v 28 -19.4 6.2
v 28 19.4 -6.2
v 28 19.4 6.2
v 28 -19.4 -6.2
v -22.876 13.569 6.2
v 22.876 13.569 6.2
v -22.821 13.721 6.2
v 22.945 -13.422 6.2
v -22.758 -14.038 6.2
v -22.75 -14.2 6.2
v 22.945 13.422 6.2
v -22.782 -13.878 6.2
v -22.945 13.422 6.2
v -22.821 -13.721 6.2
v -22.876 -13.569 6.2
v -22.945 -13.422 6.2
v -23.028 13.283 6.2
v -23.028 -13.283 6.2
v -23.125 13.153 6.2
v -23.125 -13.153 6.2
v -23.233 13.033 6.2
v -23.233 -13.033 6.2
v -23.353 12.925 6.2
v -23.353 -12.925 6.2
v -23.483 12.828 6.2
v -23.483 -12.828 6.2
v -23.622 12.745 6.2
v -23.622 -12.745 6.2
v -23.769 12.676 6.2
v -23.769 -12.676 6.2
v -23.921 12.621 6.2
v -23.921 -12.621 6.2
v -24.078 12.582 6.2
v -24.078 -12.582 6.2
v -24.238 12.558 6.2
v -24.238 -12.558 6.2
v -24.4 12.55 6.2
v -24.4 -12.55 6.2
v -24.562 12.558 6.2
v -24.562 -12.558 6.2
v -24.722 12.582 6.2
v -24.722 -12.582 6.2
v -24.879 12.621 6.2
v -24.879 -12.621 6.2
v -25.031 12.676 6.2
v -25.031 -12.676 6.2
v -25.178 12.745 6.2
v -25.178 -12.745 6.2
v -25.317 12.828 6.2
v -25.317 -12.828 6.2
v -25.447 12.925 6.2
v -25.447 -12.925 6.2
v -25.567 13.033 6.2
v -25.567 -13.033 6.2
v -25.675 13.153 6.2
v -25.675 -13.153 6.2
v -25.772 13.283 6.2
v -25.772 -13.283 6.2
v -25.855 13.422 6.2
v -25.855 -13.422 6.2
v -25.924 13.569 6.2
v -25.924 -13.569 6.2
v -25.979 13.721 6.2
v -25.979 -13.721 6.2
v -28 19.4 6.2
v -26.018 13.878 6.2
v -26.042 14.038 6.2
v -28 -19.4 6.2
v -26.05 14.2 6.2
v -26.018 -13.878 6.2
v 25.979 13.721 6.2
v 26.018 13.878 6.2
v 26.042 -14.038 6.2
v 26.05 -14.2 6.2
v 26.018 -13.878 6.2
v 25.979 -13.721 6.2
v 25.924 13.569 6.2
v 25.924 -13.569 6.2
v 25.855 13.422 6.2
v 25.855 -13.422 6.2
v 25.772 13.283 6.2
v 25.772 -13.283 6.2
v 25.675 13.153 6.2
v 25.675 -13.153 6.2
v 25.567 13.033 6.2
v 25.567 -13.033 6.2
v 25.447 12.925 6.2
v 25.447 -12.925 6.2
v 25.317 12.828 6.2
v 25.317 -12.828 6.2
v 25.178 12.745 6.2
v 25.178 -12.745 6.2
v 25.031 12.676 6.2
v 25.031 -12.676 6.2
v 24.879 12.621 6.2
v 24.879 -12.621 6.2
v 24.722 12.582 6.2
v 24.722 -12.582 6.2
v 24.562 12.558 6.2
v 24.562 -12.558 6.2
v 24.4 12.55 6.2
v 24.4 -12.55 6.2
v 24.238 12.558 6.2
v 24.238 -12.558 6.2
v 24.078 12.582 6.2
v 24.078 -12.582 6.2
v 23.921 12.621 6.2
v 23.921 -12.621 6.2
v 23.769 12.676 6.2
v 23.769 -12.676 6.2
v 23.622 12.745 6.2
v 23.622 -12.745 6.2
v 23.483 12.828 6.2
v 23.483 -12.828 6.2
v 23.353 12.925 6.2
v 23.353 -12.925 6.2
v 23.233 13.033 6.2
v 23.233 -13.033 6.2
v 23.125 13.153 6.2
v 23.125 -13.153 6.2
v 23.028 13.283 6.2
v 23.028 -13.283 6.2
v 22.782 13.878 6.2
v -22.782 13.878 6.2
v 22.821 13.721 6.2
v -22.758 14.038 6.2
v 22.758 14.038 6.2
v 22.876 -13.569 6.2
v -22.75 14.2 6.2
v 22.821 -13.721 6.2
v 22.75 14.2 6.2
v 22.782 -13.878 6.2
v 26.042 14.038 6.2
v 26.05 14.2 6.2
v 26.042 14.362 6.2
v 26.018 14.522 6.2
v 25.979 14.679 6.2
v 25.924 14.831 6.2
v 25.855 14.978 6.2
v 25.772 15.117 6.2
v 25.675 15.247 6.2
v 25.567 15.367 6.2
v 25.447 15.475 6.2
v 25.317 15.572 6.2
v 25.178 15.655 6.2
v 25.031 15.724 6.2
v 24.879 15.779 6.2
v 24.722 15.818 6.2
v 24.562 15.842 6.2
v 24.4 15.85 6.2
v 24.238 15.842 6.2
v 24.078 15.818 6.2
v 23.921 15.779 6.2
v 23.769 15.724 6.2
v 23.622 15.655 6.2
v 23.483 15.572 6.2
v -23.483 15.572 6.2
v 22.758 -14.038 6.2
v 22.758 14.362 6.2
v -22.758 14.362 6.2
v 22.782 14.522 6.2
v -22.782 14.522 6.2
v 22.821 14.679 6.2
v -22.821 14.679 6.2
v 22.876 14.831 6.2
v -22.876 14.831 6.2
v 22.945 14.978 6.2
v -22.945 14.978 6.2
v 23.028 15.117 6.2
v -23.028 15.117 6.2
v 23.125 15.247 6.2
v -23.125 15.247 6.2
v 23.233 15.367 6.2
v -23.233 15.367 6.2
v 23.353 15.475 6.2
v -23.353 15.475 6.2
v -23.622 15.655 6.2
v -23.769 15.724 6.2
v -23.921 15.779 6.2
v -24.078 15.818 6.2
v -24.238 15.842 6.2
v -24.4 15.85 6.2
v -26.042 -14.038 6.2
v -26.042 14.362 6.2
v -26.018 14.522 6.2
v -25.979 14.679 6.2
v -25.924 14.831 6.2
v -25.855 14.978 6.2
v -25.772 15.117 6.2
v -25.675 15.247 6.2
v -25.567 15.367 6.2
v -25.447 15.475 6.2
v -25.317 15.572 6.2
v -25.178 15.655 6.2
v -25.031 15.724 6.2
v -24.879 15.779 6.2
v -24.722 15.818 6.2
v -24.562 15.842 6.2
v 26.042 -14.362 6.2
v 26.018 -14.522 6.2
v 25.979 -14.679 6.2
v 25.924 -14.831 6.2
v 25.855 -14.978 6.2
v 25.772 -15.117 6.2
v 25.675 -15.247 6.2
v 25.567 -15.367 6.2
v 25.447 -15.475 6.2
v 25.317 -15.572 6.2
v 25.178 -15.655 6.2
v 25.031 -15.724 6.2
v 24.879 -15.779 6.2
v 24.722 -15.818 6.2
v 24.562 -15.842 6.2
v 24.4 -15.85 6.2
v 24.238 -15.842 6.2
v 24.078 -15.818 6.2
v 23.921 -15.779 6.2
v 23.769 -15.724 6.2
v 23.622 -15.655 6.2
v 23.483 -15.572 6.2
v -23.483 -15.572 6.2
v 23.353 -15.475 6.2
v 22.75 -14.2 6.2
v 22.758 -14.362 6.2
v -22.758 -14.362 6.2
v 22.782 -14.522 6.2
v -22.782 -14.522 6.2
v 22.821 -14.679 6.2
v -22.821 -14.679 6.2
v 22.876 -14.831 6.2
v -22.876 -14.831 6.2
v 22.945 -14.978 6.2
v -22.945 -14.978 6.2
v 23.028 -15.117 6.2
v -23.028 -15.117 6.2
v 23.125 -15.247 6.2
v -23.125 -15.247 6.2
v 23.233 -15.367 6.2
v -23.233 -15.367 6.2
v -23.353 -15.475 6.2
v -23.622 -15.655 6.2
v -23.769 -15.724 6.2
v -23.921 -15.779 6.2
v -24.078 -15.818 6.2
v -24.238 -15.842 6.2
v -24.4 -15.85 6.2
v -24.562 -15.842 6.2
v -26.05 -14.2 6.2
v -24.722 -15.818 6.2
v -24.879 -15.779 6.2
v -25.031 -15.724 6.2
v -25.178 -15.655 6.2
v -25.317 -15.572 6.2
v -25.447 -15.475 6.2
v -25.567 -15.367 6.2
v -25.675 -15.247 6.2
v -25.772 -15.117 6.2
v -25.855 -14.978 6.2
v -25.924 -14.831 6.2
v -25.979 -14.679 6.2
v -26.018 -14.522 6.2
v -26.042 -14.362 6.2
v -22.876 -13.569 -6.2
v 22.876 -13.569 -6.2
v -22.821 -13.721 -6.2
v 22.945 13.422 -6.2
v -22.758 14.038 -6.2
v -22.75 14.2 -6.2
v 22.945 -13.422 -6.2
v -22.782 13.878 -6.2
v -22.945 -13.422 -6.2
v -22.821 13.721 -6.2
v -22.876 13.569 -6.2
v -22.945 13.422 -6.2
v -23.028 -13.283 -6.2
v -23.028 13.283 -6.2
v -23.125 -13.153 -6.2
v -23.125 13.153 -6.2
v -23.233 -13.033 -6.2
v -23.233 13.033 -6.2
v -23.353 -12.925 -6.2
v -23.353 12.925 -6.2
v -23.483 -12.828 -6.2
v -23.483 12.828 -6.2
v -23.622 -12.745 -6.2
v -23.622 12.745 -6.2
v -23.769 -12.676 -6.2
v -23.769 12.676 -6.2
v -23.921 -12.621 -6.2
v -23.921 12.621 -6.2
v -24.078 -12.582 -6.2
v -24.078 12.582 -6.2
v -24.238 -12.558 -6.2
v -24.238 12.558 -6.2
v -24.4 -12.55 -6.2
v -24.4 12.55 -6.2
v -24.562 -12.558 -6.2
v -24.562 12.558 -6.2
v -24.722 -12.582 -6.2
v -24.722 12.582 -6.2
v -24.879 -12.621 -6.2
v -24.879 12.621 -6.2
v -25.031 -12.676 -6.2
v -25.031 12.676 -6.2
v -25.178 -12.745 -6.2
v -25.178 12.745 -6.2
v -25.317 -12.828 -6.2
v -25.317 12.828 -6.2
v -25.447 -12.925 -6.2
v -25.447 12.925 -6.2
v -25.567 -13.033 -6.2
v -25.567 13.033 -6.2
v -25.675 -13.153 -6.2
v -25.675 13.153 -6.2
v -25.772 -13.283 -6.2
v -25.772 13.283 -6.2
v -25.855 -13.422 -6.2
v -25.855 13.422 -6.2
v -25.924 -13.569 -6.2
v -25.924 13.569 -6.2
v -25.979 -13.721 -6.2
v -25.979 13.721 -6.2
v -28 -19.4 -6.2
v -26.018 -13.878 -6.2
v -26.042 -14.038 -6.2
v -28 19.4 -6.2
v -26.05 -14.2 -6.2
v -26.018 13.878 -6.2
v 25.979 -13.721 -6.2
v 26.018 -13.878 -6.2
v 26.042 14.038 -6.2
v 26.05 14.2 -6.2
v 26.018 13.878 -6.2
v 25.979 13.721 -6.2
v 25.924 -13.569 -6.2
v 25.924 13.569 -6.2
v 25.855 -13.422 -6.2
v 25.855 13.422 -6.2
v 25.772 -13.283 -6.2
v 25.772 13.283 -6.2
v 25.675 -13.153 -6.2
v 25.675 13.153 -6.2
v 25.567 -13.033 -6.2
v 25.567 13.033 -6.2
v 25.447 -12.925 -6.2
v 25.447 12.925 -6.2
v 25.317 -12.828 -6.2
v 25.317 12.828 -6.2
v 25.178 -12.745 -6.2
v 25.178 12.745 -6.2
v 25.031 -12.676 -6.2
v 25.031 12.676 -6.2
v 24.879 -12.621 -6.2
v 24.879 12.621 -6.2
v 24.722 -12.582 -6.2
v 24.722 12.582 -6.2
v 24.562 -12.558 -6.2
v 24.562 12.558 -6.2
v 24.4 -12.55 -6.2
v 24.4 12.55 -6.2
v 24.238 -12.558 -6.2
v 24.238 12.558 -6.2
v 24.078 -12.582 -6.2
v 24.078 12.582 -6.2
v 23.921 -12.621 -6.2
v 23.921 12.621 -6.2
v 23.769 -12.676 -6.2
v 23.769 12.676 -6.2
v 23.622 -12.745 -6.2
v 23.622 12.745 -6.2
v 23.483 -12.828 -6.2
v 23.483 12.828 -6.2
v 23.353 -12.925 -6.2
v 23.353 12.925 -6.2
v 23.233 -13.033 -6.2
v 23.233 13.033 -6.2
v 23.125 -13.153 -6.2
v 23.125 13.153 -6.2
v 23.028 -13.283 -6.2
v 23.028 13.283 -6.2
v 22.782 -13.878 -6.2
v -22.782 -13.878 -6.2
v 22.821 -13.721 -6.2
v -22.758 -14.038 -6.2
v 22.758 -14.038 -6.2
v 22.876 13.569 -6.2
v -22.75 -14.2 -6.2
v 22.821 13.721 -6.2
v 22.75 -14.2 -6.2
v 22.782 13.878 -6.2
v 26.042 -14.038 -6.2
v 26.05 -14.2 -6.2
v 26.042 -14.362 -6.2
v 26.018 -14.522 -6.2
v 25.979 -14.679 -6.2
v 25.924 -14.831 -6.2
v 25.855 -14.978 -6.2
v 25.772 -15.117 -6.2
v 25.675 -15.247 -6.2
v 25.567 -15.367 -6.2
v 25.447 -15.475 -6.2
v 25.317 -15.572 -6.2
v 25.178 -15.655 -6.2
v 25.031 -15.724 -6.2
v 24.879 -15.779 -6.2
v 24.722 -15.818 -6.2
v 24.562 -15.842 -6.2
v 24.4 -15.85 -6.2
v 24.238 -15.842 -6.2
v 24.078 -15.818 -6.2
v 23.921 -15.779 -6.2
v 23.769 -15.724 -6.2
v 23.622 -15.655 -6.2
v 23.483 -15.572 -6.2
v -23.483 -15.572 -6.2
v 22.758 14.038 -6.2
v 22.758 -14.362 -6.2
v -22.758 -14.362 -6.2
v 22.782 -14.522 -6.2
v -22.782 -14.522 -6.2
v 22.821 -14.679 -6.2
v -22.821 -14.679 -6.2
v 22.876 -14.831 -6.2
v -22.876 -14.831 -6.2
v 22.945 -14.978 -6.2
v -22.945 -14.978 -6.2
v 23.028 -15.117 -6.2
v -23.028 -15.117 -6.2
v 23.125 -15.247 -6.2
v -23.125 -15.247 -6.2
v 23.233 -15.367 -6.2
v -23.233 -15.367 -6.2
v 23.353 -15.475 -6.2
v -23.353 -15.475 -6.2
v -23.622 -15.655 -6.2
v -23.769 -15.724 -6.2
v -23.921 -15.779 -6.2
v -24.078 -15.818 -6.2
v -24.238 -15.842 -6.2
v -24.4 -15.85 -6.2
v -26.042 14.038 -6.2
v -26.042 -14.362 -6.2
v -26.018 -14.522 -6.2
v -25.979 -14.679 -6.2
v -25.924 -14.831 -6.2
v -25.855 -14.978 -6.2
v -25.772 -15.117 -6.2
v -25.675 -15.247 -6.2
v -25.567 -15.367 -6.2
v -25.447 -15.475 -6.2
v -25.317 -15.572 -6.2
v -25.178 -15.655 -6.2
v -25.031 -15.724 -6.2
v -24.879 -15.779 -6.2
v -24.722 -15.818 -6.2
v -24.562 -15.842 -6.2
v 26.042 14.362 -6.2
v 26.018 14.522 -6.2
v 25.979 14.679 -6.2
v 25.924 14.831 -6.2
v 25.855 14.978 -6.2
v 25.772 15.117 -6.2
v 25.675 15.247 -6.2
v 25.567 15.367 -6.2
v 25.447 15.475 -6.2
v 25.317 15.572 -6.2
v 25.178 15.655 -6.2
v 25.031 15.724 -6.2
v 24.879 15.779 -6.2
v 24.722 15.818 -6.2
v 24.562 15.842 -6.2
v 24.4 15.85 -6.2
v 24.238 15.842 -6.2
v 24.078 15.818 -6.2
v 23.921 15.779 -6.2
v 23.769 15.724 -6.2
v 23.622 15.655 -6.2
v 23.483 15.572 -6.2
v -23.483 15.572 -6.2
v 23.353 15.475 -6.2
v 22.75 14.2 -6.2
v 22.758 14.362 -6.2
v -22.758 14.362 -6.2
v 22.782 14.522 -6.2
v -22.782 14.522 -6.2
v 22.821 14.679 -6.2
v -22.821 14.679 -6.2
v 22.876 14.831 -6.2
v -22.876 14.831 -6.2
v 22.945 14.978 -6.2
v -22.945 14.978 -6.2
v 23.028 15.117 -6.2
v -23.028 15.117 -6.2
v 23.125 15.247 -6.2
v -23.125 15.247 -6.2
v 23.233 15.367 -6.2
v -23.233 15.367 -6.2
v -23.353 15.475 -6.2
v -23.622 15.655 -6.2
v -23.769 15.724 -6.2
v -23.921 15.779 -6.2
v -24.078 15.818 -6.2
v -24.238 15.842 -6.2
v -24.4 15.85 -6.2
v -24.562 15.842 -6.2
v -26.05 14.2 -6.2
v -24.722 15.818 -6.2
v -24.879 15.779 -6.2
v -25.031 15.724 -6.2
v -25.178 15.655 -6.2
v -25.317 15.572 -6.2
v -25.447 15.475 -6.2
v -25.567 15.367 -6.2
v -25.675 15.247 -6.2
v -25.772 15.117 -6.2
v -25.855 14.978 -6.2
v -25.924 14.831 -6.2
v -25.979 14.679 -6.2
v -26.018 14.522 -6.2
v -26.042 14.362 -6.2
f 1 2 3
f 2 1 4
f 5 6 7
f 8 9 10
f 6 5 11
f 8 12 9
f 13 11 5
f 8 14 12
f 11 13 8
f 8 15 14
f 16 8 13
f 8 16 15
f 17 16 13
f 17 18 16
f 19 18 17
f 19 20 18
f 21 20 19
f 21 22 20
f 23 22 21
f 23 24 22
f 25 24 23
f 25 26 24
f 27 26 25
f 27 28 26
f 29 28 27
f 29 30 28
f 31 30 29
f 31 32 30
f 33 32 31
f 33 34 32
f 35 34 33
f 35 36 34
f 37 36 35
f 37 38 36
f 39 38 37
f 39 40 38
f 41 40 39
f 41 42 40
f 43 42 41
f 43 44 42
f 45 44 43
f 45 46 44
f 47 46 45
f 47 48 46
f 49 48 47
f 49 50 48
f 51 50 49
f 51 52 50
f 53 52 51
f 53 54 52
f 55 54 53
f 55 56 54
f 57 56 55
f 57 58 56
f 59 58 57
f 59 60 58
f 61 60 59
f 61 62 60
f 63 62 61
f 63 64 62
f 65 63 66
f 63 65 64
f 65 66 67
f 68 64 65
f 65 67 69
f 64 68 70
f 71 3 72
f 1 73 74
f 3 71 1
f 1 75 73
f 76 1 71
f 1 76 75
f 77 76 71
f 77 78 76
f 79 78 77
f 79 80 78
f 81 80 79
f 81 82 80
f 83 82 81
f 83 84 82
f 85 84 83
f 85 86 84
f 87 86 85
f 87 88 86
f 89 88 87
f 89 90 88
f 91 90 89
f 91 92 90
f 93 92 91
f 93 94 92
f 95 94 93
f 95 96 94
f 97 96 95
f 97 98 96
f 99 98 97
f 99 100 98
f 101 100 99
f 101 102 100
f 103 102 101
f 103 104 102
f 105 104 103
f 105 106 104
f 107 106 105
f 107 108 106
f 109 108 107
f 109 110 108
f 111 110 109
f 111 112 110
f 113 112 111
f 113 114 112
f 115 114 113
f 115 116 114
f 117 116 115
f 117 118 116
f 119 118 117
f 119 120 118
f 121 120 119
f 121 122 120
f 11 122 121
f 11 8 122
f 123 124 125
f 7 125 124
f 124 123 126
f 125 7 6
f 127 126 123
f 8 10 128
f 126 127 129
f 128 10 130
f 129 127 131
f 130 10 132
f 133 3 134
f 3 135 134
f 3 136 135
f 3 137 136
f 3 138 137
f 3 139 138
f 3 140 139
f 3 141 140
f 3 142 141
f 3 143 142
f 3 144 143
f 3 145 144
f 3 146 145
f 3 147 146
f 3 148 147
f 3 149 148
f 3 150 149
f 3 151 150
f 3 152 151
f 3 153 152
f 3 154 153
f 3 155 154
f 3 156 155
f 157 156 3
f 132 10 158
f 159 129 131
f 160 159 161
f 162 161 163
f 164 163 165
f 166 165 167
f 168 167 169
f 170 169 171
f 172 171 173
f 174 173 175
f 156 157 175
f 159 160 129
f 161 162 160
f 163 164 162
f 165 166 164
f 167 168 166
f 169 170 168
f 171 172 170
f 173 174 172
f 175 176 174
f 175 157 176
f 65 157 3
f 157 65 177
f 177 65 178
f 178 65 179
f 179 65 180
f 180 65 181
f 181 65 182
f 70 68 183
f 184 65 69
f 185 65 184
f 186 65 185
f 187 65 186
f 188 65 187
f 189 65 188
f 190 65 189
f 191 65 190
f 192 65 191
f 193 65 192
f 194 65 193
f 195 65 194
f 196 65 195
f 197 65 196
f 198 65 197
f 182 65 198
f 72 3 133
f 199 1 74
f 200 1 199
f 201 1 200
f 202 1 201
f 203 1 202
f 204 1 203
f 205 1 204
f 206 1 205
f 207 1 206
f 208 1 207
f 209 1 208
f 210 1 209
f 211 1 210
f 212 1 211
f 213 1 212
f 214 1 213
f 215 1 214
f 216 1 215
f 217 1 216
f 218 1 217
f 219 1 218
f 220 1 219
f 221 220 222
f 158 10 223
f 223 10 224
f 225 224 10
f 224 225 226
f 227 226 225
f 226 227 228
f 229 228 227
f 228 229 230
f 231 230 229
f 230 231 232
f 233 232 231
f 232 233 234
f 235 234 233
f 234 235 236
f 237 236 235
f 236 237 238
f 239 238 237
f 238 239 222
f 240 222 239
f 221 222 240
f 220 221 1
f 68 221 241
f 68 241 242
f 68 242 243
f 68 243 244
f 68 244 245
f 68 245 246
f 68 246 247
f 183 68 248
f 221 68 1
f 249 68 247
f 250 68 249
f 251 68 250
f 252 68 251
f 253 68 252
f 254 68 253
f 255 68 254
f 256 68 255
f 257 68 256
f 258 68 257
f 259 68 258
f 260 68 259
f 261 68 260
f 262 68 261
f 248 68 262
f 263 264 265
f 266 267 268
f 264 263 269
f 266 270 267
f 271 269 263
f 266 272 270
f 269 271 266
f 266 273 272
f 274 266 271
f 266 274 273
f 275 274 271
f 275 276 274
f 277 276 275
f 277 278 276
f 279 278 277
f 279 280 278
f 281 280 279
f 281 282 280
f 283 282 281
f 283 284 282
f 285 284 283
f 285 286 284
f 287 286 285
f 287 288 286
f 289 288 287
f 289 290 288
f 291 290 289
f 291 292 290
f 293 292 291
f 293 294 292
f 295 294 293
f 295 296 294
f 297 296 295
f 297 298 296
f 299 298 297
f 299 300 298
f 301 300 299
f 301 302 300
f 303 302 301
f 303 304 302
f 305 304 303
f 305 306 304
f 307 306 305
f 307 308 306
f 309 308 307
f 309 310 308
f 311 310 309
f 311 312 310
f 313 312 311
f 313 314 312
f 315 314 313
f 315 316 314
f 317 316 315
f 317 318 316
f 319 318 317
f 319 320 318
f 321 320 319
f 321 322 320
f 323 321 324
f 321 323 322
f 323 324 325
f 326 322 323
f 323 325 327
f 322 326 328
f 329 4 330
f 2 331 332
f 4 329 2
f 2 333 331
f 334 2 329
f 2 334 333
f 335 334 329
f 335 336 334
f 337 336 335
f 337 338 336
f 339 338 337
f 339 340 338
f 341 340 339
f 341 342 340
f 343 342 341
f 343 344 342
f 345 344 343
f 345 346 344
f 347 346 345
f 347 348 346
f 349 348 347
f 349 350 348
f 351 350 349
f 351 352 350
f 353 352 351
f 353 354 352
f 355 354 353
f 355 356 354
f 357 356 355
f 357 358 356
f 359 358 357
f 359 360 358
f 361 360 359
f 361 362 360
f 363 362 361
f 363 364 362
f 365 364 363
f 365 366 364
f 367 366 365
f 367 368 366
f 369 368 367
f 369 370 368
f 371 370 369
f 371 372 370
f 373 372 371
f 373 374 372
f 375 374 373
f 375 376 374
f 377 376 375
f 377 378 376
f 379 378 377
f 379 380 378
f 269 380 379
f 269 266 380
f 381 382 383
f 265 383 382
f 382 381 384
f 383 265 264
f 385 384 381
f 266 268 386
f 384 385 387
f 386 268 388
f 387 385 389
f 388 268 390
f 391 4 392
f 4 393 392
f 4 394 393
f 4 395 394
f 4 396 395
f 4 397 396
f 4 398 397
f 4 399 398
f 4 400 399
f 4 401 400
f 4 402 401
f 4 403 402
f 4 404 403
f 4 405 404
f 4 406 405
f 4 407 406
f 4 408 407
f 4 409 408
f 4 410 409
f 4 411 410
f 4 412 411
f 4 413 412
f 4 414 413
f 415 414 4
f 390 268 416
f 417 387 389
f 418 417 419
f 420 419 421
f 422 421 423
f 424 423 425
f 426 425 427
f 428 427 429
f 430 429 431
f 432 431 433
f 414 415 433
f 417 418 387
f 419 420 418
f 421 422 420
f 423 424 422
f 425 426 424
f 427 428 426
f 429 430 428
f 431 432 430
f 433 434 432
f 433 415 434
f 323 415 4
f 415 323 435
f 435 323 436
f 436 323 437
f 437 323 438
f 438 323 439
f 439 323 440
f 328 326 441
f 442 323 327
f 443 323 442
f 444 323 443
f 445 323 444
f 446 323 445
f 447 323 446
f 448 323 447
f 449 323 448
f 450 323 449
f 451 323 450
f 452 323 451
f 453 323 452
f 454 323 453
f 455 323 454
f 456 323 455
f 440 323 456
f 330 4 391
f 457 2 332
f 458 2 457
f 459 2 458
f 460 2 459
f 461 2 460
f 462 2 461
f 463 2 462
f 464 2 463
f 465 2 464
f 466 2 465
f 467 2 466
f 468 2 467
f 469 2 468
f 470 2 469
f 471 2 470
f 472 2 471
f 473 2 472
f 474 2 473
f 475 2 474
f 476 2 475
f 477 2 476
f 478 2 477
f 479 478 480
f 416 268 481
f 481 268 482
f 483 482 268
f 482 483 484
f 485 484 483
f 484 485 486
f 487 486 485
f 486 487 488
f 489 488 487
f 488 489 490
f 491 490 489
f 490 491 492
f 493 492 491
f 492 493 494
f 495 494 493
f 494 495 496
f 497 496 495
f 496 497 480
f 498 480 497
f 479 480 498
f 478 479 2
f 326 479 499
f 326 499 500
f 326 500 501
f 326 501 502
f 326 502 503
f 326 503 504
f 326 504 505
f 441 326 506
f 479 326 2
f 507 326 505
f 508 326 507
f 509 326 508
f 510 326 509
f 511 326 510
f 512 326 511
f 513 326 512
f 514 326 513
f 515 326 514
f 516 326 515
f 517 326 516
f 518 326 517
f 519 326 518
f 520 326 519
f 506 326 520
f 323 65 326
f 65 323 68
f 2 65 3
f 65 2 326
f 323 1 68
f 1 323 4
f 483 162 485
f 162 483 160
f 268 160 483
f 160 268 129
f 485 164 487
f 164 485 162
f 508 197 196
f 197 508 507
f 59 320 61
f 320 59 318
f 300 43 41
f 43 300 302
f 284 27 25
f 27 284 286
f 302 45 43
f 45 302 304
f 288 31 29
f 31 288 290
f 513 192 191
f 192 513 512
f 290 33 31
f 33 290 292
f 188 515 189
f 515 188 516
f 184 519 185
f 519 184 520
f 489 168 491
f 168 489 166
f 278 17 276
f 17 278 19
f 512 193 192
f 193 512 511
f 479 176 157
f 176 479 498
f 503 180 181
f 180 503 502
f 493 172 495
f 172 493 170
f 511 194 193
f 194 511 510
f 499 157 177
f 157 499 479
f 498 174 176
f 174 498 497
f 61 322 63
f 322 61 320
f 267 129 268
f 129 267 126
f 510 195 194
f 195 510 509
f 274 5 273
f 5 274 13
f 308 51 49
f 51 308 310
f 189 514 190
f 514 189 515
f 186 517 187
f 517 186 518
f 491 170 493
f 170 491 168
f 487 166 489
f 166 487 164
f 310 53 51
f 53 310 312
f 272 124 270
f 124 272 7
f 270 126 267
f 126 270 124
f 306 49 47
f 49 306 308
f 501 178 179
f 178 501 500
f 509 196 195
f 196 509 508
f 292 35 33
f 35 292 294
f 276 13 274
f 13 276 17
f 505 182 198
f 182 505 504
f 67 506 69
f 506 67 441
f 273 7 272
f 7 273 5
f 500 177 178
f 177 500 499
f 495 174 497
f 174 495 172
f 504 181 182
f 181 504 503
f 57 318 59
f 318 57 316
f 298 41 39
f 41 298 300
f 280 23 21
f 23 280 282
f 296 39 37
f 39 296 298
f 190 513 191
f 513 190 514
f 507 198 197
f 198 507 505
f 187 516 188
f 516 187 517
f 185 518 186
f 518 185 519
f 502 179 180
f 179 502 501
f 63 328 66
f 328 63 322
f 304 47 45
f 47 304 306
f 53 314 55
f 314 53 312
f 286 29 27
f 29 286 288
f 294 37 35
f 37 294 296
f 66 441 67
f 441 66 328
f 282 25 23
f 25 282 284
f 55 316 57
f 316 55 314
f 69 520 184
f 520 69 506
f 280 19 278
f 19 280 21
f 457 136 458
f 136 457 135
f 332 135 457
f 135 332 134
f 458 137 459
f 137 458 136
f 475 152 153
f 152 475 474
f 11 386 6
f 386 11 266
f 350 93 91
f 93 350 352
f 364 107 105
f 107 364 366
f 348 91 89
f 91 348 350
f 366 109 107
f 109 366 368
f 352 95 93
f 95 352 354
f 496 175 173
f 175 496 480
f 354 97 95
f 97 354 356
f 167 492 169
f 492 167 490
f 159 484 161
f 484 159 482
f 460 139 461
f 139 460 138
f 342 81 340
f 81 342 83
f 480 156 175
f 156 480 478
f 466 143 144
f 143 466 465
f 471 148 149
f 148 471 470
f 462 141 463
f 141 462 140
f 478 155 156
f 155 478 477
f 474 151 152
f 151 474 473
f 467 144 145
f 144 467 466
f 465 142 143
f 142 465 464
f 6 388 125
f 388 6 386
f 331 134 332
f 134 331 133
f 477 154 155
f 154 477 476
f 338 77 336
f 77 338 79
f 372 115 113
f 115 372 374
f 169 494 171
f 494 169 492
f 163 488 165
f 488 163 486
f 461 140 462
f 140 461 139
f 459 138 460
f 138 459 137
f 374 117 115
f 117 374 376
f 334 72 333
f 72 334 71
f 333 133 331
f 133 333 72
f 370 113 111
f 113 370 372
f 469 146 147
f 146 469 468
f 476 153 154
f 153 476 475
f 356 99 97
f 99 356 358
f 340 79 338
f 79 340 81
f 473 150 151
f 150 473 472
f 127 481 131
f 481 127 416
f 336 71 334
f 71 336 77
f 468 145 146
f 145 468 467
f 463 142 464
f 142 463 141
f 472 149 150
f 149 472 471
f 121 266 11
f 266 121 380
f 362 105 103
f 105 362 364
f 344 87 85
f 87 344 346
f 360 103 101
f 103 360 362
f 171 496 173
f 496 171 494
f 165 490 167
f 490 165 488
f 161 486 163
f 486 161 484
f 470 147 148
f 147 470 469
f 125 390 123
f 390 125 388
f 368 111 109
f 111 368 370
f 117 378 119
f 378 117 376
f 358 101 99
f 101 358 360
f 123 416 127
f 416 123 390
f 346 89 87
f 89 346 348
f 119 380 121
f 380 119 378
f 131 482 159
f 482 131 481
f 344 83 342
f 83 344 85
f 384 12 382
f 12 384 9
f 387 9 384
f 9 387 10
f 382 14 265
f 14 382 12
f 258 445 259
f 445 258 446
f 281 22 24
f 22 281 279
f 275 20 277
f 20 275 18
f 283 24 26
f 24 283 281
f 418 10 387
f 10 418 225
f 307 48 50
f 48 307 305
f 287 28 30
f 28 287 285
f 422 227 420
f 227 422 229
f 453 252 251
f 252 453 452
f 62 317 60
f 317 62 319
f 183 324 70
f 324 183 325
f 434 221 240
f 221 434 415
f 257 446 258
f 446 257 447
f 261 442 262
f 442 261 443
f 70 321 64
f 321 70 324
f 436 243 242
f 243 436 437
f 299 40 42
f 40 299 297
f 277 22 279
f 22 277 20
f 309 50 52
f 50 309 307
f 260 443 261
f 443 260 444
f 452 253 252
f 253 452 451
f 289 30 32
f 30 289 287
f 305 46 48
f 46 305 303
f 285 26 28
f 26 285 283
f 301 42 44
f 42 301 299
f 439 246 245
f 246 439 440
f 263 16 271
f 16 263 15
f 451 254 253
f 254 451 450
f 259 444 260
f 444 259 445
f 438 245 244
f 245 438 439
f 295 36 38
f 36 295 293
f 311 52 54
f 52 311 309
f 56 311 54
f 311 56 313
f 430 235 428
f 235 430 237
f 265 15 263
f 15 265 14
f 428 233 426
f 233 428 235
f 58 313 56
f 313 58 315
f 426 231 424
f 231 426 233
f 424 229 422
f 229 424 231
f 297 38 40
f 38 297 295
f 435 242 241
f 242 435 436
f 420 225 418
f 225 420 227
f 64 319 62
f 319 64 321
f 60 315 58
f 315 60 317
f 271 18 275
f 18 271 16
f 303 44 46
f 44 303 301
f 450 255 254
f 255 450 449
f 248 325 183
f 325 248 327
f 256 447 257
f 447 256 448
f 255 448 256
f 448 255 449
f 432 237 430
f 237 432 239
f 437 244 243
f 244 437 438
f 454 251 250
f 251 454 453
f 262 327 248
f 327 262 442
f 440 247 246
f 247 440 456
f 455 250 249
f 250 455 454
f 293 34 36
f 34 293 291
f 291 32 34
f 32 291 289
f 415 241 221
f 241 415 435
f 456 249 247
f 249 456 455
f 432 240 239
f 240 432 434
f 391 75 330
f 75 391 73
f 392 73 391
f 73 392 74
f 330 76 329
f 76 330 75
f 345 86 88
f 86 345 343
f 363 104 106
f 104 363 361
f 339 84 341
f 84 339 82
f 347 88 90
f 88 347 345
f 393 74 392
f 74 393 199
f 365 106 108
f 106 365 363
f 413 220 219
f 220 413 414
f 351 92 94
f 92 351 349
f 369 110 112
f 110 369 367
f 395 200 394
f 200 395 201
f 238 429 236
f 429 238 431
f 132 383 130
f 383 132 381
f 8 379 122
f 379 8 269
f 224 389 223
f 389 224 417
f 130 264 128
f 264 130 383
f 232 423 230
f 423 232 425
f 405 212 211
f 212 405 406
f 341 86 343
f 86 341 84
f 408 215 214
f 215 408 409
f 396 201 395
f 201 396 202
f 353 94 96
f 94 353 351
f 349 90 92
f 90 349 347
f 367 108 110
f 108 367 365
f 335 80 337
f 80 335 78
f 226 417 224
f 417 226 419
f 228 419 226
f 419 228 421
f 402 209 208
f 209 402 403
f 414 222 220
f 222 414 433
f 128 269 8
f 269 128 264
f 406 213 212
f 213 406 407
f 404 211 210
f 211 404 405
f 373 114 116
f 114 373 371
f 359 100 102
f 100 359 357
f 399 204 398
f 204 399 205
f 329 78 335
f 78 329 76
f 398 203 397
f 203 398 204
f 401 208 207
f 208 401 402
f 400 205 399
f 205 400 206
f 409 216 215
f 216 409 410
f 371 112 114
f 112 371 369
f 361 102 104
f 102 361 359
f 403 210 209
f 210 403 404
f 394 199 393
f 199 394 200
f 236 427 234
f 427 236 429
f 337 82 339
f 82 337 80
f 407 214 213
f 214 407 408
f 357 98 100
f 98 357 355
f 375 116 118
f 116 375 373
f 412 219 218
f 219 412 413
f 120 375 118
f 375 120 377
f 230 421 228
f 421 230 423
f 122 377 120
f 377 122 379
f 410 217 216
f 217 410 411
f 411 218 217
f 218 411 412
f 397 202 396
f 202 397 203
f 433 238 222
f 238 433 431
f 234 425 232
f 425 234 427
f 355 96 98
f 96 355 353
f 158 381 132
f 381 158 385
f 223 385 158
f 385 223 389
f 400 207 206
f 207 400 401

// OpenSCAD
$fn = 64;
SMART_WIDTH = 56.0;
SMART_DEPTH = 38.8;
SMART_HEIGHT = 12.4;
SMART_HOLE_DIAM = 3.3;
SMART_HOLE_X_DIST = 48.8;
SMART_HOLE_Y_DIST = 28.4;
SMART_MOUNT_HEIGHT = 4;
SMART_SCREW_DIAM = SMART_HOLE_DIAM * 0.9;

module smart(){
  difference(){
    /* Body */
    union(){
      cube([SMART_WIDTH, SMART_DEPTH, SMART_HEIGHT], true);
    }
    /* Top left screw hole */
    translate([-SMART_HOLE_X_DIST / 2, SMART_HOLE_Y_DIST / 2, 0]){
      cylinder(SMART_DEPTH * 2, SMART_HOLE_DIAM / 2, SMART_HOLE_DIAM / 2, true);
    }
    /* Top right screw hole */
    translate([SMART_HOLE_X_DIST / 2, SMART_HOLE_Y_DIST / 2, 0]){
      cylinder(SMART_DEPTH * 2, SMART_HOLE_DIAM / 2, SMART_HOLE_DIAM / 2, true);
    }
    /* Bottom left screw hole */
    translate([-SMART_HOLE_X_DIST / 2, -SMART_HOLE_Y_DIST / 2, 0]){
      cylinder(SMART_DEPTH * 2, SMART_HOLE_DIAM / 2, SMART_HOLE_DIAM / 2, true);
    }
    /* Bottom right screw hole */
    translate([SMART_HOLE_X_DIST / 2, -SMART_HOLE_Y_DIST / 2, 0]){
      cylinder(SMART_DEPTH * 2, SMART_HOLE_DIAM / 2, SMART_HOLE_DIAM / 2, true);
    }
  }
}

smart();
